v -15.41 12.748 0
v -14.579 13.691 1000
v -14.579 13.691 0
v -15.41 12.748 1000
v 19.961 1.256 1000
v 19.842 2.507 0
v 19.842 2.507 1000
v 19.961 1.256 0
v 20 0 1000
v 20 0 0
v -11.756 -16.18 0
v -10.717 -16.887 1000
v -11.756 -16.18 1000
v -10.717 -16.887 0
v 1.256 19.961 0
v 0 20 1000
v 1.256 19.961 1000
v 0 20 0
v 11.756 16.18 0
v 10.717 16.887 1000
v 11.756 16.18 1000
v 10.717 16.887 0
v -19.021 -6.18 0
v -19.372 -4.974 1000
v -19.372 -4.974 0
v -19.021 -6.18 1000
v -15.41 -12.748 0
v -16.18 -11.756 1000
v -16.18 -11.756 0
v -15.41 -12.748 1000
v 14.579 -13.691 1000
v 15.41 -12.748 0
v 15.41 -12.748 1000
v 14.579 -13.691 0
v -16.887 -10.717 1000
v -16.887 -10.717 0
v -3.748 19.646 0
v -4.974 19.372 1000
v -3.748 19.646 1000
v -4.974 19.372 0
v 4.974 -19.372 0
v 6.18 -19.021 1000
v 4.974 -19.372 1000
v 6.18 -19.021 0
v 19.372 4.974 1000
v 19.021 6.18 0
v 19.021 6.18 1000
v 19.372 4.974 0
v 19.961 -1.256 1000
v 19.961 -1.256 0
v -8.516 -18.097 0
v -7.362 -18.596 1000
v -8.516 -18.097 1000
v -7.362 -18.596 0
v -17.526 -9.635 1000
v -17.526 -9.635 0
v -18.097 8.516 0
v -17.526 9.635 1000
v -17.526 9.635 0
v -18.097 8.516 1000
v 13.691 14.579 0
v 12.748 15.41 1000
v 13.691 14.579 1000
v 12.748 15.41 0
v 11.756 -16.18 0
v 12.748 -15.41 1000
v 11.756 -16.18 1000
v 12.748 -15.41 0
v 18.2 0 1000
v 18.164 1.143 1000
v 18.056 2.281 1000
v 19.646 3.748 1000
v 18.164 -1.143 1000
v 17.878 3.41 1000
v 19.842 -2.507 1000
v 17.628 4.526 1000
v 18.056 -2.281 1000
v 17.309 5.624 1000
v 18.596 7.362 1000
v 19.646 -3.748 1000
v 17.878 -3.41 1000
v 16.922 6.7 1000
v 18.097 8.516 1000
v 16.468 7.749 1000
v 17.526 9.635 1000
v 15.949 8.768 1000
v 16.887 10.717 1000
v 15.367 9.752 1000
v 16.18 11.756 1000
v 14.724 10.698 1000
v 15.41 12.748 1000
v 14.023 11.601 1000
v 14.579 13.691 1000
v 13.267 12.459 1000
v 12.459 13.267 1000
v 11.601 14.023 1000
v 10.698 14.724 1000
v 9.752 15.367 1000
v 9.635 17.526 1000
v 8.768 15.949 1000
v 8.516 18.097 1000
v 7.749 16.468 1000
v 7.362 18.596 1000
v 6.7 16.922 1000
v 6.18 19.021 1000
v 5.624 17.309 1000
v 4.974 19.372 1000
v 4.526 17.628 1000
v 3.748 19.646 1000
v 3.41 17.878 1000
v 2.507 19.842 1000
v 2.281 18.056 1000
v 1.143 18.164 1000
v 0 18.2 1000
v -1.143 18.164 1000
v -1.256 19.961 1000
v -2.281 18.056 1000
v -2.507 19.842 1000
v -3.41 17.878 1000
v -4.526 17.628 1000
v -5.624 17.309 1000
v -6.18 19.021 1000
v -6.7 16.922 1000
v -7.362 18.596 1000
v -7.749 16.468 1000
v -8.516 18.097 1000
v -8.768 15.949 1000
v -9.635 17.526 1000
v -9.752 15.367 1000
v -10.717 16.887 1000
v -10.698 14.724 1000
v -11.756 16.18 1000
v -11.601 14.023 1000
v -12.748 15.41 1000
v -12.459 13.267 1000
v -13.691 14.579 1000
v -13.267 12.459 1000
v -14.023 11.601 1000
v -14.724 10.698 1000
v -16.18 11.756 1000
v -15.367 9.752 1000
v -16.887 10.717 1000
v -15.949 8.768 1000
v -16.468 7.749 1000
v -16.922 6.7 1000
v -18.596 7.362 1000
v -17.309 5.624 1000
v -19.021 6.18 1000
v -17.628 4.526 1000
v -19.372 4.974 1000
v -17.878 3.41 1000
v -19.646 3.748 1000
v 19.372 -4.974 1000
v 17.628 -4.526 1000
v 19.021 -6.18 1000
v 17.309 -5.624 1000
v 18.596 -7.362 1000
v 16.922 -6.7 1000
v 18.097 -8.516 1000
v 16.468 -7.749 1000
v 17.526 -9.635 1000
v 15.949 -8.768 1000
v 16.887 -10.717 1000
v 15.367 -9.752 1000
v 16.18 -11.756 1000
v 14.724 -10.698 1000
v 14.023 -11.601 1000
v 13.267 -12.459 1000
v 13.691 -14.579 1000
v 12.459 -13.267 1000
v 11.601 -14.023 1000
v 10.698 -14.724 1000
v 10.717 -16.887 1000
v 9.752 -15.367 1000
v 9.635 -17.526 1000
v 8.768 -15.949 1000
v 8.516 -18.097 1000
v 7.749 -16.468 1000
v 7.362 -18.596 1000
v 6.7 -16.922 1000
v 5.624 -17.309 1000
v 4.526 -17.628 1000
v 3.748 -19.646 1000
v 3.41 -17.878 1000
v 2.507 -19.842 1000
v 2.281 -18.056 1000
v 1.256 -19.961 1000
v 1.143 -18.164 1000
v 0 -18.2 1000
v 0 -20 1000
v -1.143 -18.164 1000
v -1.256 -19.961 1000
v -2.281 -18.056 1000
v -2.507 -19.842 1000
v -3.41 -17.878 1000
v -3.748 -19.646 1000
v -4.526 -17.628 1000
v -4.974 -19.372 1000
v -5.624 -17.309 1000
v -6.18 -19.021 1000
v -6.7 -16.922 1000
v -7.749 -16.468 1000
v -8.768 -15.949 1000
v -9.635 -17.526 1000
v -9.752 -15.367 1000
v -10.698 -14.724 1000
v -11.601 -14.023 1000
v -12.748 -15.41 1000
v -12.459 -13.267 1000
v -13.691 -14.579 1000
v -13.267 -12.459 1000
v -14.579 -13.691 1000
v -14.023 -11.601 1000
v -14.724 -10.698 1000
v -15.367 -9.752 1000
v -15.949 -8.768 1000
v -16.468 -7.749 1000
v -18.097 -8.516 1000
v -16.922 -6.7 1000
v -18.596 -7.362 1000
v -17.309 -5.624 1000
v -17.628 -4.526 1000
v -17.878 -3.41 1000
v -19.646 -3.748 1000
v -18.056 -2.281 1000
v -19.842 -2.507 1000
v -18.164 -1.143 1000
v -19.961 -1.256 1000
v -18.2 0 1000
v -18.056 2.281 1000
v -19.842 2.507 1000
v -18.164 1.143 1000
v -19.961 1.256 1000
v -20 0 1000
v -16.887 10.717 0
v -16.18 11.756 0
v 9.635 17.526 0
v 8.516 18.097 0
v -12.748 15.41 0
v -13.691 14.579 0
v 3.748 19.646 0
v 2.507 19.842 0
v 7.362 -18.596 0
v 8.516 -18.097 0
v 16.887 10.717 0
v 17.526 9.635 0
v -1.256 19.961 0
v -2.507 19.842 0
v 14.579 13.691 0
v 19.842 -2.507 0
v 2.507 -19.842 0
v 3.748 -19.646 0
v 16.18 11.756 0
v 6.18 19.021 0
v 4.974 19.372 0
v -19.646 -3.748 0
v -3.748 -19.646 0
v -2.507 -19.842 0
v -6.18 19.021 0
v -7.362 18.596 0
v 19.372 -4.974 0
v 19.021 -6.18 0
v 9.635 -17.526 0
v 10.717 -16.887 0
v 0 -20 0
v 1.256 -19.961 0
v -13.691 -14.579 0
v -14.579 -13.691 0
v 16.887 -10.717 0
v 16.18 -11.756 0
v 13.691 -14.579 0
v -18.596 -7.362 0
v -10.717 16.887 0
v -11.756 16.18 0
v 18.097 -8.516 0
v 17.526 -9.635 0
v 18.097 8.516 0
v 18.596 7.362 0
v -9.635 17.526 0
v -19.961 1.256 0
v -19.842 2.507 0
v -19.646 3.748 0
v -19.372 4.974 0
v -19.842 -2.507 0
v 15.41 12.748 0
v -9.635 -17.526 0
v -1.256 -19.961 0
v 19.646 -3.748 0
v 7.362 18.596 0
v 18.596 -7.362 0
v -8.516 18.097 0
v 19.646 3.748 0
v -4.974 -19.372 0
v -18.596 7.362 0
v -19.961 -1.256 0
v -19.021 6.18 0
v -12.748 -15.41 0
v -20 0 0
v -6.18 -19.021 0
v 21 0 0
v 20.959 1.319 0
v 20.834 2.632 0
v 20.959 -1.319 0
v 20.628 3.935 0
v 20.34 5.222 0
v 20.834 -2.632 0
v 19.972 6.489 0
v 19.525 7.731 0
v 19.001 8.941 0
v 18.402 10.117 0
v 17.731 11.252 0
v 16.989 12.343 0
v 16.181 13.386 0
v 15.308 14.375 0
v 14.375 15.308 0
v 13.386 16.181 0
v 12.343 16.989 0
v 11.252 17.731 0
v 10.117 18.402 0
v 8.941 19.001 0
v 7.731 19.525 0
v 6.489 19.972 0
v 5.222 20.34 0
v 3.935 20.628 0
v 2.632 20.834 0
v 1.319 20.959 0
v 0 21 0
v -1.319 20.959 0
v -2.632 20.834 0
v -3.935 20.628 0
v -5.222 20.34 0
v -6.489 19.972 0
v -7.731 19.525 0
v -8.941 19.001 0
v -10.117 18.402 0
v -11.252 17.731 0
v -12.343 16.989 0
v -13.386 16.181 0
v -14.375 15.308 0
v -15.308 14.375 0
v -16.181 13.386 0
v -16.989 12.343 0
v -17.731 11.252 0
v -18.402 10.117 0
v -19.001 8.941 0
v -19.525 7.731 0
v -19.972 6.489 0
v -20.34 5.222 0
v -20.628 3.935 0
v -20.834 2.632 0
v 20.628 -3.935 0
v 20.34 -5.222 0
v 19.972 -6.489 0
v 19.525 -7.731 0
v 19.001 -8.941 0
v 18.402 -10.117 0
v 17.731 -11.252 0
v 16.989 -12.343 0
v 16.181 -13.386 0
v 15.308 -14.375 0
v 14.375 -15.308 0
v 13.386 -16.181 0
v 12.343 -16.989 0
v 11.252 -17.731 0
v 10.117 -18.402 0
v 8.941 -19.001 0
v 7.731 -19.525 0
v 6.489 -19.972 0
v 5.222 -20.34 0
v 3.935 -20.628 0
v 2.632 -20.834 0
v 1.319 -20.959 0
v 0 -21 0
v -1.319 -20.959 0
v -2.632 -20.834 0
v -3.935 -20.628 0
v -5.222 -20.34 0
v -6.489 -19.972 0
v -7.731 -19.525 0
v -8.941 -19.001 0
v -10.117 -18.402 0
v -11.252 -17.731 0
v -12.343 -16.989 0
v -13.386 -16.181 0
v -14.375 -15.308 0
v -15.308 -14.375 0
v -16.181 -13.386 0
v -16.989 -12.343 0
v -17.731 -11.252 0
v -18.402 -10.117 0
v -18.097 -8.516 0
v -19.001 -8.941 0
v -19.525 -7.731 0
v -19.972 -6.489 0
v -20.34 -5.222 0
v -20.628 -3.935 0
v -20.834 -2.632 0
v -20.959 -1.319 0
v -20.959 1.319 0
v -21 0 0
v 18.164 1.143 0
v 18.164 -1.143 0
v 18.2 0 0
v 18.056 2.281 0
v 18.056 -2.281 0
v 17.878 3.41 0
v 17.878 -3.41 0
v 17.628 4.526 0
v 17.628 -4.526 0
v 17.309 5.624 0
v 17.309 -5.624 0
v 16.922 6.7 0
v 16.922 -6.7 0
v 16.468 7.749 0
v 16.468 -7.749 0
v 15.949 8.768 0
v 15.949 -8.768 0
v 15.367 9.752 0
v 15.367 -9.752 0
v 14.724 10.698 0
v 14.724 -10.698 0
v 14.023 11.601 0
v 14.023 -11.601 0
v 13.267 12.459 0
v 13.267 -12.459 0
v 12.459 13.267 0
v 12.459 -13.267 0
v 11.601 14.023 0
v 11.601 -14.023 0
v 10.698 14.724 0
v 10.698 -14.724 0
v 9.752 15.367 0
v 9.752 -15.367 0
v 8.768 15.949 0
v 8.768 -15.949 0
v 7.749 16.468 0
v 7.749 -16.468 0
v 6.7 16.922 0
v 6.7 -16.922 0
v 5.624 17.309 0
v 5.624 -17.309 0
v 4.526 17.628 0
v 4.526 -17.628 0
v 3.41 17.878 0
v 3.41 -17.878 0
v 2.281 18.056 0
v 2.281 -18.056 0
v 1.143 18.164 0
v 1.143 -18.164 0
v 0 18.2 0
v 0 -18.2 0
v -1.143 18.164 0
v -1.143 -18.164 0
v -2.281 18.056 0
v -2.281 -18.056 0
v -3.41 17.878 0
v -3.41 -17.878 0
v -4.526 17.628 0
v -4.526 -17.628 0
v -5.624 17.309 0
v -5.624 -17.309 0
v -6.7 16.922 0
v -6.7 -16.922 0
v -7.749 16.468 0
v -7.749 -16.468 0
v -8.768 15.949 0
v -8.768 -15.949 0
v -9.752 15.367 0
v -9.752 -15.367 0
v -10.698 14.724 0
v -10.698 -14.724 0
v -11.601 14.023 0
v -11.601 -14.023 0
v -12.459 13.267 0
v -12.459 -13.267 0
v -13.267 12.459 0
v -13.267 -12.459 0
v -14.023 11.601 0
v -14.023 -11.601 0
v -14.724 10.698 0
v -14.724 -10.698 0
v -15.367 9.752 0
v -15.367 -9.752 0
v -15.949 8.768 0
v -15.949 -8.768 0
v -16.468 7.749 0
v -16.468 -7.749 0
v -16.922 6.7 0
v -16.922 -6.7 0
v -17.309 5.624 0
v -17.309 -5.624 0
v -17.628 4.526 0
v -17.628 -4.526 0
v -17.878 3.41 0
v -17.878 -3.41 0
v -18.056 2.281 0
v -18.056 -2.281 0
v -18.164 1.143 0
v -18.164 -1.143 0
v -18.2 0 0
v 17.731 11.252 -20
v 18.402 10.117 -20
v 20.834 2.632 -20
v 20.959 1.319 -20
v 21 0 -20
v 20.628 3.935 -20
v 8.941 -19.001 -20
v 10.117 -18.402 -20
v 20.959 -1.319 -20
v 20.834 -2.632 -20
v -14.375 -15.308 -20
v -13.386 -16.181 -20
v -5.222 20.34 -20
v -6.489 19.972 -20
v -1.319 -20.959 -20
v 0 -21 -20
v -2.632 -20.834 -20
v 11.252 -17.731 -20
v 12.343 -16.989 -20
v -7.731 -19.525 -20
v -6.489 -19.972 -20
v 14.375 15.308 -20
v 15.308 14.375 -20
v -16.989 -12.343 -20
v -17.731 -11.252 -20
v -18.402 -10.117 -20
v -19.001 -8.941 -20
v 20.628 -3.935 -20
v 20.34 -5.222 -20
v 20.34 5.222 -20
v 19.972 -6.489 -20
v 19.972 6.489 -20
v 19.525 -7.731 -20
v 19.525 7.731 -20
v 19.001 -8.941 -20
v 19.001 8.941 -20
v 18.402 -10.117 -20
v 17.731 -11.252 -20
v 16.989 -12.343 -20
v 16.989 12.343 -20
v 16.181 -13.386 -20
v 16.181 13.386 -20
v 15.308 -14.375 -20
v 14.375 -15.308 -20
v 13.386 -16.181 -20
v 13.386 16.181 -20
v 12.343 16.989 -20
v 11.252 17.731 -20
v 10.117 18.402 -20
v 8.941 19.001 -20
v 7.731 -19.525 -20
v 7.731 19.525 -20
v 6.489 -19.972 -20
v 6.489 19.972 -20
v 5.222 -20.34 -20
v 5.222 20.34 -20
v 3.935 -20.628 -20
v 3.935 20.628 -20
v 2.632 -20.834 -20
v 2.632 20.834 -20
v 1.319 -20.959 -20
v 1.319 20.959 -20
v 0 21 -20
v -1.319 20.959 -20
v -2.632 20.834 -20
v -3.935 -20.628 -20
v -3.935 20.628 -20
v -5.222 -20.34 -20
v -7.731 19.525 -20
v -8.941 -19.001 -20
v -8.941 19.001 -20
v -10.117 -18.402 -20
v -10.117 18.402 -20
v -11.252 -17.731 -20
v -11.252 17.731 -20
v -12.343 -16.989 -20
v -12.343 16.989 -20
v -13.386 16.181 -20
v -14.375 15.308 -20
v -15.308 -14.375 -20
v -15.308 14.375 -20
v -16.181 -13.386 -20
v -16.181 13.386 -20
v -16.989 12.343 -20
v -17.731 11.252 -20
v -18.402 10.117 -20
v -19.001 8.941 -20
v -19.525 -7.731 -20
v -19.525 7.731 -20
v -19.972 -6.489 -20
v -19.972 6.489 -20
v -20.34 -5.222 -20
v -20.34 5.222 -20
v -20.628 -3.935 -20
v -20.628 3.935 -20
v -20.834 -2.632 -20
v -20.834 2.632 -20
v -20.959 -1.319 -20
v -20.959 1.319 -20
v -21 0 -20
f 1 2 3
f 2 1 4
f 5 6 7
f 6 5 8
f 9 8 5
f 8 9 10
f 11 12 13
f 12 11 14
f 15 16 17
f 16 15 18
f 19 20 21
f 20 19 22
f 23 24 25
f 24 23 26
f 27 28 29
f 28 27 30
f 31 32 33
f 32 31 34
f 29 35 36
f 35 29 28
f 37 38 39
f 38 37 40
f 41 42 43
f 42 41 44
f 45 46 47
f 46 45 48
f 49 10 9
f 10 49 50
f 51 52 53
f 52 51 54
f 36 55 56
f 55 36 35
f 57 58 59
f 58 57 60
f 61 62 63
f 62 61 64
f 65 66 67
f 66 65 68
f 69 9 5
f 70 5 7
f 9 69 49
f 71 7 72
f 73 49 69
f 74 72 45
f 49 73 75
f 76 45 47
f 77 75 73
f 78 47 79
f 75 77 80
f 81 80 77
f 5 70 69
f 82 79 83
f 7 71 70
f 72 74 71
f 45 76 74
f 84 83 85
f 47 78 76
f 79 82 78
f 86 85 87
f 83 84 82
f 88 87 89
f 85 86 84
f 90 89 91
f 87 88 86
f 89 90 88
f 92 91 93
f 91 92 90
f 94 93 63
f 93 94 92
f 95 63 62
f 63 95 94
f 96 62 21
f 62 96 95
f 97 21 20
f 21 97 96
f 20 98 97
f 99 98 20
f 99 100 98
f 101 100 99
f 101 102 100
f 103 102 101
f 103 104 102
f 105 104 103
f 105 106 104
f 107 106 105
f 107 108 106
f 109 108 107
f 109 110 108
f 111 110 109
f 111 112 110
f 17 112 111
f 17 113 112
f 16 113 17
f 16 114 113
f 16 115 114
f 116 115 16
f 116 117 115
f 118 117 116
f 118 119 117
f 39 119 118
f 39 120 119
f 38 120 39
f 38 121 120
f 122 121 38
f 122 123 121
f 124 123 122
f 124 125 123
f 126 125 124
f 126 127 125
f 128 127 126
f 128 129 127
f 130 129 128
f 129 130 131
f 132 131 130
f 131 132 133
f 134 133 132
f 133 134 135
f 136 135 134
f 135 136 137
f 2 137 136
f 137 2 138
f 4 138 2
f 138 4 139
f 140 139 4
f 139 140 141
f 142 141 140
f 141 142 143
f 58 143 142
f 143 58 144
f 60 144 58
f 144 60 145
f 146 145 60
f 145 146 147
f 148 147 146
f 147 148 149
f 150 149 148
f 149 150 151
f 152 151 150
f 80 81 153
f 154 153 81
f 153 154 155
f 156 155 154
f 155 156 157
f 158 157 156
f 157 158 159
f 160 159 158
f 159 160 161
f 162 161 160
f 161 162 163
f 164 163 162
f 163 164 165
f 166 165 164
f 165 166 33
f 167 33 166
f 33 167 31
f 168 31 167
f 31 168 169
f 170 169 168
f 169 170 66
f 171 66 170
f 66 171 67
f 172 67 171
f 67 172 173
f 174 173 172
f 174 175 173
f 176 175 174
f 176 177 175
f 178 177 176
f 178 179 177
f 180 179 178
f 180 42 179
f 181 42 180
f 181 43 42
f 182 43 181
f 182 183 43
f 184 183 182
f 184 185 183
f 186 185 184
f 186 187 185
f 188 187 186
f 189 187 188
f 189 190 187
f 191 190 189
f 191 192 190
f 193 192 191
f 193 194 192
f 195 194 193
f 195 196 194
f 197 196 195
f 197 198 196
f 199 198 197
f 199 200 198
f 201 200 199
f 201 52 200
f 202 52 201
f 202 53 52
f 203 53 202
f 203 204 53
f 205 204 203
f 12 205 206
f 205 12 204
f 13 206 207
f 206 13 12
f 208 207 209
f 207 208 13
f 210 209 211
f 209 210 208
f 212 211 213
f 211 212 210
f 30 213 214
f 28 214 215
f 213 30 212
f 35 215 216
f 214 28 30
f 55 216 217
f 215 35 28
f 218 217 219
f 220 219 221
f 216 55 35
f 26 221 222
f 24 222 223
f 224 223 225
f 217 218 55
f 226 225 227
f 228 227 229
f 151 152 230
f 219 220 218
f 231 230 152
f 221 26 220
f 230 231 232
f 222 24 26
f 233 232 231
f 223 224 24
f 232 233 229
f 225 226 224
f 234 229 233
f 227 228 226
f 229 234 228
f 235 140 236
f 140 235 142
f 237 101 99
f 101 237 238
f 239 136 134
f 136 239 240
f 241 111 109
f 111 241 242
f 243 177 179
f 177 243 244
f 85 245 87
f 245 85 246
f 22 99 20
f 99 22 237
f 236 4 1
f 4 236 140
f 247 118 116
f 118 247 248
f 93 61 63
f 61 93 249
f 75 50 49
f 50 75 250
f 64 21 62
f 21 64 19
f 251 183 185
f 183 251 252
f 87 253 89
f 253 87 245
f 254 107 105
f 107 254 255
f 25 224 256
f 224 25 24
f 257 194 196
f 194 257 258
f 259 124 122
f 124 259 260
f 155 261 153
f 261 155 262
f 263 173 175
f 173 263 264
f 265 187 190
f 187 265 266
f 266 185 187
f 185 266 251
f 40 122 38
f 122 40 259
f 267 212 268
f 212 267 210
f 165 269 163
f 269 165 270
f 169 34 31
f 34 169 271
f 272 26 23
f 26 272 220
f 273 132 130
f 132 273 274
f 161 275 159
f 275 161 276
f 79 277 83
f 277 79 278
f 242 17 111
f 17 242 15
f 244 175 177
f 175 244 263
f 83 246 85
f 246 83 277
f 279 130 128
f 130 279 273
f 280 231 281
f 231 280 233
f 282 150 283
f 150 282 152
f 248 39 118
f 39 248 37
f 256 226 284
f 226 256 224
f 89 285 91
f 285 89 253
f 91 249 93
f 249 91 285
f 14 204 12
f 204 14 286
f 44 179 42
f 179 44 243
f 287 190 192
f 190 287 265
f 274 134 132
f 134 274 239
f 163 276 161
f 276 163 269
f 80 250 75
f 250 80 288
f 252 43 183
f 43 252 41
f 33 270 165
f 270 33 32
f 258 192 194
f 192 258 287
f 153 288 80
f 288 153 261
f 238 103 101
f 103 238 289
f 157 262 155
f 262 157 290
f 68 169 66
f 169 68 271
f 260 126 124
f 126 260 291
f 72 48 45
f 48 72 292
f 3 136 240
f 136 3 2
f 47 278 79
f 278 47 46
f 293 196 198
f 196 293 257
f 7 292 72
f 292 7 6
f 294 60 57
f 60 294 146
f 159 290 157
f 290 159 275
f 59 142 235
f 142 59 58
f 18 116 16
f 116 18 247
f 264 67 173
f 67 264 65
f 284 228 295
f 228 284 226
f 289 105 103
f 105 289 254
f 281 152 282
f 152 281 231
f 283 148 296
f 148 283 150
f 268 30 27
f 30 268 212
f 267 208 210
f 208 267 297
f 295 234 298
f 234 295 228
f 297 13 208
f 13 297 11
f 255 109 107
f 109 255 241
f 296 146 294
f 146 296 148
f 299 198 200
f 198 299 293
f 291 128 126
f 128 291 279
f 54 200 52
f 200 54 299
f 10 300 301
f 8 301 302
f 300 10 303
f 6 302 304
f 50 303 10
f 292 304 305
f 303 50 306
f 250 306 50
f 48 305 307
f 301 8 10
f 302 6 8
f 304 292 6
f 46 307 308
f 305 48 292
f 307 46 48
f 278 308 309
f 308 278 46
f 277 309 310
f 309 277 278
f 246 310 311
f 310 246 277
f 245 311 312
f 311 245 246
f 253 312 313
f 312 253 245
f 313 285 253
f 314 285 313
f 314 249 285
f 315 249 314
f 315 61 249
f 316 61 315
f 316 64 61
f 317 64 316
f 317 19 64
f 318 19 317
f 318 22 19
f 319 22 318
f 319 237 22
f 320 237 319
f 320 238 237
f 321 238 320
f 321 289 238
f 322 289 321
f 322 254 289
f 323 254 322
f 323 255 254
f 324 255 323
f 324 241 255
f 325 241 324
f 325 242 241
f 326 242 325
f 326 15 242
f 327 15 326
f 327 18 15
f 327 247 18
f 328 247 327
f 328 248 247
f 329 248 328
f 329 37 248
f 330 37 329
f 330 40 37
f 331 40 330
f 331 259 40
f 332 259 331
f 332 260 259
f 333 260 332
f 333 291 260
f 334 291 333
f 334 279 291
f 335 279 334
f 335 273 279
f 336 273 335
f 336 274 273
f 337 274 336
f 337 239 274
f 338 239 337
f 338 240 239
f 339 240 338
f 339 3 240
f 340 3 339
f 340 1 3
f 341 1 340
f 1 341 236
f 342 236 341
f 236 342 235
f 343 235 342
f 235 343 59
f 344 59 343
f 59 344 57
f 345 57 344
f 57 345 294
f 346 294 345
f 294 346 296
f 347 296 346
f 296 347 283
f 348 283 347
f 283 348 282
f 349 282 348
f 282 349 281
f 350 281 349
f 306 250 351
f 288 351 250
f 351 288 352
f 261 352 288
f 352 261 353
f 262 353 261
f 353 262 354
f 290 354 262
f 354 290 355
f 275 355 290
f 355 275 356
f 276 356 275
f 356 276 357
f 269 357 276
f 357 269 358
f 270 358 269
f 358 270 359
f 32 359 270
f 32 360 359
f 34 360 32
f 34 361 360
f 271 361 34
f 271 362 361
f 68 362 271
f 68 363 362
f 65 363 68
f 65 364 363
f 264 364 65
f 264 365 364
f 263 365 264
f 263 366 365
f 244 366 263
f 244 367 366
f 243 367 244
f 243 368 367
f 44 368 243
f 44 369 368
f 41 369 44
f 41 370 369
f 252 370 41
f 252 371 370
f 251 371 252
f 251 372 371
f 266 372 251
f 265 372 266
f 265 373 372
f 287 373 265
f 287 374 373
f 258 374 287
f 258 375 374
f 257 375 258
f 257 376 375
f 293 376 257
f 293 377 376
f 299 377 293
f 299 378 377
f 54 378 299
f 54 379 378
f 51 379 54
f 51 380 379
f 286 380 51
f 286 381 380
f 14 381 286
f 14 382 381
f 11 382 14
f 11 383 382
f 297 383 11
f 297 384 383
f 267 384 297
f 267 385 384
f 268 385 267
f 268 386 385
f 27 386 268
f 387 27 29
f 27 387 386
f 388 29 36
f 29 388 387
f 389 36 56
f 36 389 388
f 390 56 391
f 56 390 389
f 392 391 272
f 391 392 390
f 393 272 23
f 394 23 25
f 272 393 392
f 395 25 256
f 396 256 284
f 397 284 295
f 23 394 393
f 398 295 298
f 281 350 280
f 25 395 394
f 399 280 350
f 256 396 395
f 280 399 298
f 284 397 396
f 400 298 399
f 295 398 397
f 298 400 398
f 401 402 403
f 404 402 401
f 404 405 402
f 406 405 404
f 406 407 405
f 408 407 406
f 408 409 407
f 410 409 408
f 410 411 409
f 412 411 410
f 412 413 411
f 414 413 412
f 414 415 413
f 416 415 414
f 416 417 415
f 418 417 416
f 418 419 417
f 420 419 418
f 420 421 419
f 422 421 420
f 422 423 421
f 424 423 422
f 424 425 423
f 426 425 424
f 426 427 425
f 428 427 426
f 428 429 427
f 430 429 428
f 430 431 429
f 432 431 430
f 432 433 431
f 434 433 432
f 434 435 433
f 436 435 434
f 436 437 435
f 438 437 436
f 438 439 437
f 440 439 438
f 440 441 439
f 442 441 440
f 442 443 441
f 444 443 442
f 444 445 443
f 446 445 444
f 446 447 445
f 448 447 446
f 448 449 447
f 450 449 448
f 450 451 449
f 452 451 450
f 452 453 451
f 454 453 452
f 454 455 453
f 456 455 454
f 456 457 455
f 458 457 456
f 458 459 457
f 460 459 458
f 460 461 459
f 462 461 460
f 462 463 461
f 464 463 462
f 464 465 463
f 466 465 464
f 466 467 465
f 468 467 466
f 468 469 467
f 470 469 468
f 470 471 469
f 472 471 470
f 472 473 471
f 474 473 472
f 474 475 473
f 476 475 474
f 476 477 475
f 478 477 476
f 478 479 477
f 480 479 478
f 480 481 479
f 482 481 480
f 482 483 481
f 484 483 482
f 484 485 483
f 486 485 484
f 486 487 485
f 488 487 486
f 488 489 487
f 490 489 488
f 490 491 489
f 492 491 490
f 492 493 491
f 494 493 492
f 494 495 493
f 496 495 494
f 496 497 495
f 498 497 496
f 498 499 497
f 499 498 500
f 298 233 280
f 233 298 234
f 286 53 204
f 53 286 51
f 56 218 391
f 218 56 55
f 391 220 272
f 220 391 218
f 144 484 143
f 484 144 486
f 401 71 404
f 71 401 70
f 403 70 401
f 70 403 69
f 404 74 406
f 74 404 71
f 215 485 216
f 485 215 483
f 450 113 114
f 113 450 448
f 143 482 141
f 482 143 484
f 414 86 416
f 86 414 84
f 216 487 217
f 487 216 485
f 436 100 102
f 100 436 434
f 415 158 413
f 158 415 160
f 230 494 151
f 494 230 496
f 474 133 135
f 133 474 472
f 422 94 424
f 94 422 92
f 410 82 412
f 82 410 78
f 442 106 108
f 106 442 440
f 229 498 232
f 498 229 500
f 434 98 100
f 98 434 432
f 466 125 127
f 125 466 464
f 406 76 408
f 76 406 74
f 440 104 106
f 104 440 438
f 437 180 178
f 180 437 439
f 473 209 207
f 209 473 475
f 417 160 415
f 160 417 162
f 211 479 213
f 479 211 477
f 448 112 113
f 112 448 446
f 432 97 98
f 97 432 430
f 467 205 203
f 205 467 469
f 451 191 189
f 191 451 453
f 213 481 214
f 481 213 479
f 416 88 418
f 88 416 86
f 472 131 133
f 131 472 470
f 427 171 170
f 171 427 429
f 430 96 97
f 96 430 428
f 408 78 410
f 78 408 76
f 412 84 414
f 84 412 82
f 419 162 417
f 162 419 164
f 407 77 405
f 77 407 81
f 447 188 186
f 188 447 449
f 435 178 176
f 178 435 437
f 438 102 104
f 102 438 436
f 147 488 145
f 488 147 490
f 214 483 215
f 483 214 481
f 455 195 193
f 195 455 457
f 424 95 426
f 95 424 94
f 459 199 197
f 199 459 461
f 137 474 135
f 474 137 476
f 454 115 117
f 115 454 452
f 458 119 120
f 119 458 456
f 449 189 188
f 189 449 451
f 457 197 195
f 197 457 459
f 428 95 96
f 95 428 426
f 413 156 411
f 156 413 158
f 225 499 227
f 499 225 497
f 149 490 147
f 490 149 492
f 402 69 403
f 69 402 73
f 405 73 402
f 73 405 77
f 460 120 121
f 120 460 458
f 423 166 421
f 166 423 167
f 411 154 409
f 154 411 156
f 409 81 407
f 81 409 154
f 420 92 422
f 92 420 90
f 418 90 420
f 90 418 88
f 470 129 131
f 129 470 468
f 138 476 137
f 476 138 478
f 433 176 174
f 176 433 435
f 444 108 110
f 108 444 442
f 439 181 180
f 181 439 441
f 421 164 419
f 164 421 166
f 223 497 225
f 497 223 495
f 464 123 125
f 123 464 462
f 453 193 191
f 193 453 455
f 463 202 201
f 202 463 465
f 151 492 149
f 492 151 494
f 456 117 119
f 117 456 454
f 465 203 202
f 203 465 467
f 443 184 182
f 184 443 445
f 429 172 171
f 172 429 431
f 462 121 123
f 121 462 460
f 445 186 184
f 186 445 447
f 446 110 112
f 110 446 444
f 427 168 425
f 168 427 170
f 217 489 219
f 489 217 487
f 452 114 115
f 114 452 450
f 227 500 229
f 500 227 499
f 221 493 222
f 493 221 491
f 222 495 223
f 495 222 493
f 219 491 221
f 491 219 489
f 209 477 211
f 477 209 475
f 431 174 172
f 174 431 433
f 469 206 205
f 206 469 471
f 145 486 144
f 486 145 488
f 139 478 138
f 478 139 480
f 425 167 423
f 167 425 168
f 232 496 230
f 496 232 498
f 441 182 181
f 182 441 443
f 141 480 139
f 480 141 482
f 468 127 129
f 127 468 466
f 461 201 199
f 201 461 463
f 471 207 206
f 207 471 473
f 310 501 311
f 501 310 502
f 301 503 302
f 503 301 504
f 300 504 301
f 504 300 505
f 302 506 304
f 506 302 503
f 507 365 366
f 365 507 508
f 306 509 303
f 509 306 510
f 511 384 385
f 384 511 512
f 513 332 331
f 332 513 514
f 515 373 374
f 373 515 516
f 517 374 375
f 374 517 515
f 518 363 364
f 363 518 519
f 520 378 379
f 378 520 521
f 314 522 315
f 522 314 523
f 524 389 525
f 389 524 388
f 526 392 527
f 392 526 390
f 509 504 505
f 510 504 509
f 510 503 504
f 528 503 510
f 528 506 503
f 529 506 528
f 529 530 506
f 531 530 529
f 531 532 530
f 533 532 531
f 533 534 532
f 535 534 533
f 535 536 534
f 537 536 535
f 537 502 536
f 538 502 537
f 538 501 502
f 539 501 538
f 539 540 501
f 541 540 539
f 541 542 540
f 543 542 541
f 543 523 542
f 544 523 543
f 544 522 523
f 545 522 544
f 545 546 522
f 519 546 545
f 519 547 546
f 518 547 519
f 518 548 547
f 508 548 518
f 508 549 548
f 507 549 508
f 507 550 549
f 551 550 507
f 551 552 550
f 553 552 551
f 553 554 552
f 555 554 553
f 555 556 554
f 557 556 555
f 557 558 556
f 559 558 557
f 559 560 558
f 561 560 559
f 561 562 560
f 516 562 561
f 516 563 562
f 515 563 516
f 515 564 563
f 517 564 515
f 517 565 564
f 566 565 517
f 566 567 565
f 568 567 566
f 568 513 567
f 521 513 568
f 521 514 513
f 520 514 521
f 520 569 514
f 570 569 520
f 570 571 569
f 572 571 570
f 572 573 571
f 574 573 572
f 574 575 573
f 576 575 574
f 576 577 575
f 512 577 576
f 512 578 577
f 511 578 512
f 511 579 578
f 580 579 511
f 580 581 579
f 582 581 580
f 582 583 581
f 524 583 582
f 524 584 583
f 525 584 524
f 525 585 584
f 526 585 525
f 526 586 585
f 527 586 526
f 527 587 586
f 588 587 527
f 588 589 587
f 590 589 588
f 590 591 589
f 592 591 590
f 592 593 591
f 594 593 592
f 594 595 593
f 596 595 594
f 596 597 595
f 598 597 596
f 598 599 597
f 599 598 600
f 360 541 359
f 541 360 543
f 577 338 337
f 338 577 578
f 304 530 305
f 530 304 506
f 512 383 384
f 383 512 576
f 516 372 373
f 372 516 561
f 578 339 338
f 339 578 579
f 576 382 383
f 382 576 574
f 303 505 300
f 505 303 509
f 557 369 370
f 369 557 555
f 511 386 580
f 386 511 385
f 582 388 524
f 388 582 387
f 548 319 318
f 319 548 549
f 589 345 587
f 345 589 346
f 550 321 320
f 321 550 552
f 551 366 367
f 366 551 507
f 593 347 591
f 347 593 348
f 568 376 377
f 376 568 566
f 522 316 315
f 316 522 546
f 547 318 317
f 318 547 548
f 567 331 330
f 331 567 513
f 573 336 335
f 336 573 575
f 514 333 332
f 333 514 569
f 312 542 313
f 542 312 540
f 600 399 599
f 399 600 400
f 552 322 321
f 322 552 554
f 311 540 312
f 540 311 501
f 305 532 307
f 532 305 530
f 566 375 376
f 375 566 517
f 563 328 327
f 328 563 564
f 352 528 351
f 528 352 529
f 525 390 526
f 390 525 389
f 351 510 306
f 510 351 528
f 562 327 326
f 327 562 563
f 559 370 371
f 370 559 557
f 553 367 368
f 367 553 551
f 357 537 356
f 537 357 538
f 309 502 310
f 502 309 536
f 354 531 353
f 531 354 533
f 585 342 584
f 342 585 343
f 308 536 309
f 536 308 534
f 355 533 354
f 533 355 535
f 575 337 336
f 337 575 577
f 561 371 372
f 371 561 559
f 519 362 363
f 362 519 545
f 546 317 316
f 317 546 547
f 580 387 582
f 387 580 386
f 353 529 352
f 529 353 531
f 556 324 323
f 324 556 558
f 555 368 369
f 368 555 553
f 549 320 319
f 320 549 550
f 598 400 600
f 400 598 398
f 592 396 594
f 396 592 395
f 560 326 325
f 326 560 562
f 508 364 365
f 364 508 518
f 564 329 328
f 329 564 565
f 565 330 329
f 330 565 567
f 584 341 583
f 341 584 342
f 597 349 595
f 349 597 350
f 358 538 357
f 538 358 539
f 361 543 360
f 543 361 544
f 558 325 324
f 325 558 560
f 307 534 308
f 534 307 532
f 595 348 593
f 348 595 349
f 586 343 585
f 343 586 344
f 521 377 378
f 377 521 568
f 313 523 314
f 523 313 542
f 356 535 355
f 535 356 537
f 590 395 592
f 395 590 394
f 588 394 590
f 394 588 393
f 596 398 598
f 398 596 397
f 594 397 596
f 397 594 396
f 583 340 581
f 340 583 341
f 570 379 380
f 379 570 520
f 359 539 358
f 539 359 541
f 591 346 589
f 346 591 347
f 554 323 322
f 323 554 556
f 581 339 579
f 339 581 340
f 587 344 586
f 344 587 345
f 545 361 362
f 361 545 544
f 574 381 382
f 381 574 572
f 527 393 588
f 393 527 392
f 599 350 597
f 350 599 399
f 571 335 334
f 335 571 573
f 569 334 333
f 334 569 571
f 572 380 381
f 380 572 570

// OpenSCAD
// Define the HT pipe parameters
module ht_pipe_segment(length) {
    ht_pipe(length);
    integrated_end_fitting();
}

// Define the HT pipe geometry
module ht_pipe(length) {
    // HT 40 pipe dimensions
    outer_diameter = 40; // Outer diameter in mm
    wall_thickness = 1.8; // Wall thickness in mm
    inner_diameter = outer_diameter - 2 * wall_thickness;
    
    // Create the pipe
    difference() {
        cylinder(h = length, d = outer_diameter, $fn = 100);
        translate([0, 0, -1])
            cylinder(h = length + 2, d = inner_diameter, $fn = 100);
    }
}

// Define the integrated end fitting
module integrated_end_fitting() {
    // End fitting dimensions
    fitting_length = 20; // Length of the fitting in mm
    fitting_diameter = 42; // Diameter of the fitting in mm
    
    // Create the end fitting
    translate([0, 0, -fitting_length])
        cylinder(h = fitting_length, d = fitting_diameter, $fn = 100);
}

// Create the HT pipe segment with a length of 1000 mm
ht_pipe_segment(1000);
